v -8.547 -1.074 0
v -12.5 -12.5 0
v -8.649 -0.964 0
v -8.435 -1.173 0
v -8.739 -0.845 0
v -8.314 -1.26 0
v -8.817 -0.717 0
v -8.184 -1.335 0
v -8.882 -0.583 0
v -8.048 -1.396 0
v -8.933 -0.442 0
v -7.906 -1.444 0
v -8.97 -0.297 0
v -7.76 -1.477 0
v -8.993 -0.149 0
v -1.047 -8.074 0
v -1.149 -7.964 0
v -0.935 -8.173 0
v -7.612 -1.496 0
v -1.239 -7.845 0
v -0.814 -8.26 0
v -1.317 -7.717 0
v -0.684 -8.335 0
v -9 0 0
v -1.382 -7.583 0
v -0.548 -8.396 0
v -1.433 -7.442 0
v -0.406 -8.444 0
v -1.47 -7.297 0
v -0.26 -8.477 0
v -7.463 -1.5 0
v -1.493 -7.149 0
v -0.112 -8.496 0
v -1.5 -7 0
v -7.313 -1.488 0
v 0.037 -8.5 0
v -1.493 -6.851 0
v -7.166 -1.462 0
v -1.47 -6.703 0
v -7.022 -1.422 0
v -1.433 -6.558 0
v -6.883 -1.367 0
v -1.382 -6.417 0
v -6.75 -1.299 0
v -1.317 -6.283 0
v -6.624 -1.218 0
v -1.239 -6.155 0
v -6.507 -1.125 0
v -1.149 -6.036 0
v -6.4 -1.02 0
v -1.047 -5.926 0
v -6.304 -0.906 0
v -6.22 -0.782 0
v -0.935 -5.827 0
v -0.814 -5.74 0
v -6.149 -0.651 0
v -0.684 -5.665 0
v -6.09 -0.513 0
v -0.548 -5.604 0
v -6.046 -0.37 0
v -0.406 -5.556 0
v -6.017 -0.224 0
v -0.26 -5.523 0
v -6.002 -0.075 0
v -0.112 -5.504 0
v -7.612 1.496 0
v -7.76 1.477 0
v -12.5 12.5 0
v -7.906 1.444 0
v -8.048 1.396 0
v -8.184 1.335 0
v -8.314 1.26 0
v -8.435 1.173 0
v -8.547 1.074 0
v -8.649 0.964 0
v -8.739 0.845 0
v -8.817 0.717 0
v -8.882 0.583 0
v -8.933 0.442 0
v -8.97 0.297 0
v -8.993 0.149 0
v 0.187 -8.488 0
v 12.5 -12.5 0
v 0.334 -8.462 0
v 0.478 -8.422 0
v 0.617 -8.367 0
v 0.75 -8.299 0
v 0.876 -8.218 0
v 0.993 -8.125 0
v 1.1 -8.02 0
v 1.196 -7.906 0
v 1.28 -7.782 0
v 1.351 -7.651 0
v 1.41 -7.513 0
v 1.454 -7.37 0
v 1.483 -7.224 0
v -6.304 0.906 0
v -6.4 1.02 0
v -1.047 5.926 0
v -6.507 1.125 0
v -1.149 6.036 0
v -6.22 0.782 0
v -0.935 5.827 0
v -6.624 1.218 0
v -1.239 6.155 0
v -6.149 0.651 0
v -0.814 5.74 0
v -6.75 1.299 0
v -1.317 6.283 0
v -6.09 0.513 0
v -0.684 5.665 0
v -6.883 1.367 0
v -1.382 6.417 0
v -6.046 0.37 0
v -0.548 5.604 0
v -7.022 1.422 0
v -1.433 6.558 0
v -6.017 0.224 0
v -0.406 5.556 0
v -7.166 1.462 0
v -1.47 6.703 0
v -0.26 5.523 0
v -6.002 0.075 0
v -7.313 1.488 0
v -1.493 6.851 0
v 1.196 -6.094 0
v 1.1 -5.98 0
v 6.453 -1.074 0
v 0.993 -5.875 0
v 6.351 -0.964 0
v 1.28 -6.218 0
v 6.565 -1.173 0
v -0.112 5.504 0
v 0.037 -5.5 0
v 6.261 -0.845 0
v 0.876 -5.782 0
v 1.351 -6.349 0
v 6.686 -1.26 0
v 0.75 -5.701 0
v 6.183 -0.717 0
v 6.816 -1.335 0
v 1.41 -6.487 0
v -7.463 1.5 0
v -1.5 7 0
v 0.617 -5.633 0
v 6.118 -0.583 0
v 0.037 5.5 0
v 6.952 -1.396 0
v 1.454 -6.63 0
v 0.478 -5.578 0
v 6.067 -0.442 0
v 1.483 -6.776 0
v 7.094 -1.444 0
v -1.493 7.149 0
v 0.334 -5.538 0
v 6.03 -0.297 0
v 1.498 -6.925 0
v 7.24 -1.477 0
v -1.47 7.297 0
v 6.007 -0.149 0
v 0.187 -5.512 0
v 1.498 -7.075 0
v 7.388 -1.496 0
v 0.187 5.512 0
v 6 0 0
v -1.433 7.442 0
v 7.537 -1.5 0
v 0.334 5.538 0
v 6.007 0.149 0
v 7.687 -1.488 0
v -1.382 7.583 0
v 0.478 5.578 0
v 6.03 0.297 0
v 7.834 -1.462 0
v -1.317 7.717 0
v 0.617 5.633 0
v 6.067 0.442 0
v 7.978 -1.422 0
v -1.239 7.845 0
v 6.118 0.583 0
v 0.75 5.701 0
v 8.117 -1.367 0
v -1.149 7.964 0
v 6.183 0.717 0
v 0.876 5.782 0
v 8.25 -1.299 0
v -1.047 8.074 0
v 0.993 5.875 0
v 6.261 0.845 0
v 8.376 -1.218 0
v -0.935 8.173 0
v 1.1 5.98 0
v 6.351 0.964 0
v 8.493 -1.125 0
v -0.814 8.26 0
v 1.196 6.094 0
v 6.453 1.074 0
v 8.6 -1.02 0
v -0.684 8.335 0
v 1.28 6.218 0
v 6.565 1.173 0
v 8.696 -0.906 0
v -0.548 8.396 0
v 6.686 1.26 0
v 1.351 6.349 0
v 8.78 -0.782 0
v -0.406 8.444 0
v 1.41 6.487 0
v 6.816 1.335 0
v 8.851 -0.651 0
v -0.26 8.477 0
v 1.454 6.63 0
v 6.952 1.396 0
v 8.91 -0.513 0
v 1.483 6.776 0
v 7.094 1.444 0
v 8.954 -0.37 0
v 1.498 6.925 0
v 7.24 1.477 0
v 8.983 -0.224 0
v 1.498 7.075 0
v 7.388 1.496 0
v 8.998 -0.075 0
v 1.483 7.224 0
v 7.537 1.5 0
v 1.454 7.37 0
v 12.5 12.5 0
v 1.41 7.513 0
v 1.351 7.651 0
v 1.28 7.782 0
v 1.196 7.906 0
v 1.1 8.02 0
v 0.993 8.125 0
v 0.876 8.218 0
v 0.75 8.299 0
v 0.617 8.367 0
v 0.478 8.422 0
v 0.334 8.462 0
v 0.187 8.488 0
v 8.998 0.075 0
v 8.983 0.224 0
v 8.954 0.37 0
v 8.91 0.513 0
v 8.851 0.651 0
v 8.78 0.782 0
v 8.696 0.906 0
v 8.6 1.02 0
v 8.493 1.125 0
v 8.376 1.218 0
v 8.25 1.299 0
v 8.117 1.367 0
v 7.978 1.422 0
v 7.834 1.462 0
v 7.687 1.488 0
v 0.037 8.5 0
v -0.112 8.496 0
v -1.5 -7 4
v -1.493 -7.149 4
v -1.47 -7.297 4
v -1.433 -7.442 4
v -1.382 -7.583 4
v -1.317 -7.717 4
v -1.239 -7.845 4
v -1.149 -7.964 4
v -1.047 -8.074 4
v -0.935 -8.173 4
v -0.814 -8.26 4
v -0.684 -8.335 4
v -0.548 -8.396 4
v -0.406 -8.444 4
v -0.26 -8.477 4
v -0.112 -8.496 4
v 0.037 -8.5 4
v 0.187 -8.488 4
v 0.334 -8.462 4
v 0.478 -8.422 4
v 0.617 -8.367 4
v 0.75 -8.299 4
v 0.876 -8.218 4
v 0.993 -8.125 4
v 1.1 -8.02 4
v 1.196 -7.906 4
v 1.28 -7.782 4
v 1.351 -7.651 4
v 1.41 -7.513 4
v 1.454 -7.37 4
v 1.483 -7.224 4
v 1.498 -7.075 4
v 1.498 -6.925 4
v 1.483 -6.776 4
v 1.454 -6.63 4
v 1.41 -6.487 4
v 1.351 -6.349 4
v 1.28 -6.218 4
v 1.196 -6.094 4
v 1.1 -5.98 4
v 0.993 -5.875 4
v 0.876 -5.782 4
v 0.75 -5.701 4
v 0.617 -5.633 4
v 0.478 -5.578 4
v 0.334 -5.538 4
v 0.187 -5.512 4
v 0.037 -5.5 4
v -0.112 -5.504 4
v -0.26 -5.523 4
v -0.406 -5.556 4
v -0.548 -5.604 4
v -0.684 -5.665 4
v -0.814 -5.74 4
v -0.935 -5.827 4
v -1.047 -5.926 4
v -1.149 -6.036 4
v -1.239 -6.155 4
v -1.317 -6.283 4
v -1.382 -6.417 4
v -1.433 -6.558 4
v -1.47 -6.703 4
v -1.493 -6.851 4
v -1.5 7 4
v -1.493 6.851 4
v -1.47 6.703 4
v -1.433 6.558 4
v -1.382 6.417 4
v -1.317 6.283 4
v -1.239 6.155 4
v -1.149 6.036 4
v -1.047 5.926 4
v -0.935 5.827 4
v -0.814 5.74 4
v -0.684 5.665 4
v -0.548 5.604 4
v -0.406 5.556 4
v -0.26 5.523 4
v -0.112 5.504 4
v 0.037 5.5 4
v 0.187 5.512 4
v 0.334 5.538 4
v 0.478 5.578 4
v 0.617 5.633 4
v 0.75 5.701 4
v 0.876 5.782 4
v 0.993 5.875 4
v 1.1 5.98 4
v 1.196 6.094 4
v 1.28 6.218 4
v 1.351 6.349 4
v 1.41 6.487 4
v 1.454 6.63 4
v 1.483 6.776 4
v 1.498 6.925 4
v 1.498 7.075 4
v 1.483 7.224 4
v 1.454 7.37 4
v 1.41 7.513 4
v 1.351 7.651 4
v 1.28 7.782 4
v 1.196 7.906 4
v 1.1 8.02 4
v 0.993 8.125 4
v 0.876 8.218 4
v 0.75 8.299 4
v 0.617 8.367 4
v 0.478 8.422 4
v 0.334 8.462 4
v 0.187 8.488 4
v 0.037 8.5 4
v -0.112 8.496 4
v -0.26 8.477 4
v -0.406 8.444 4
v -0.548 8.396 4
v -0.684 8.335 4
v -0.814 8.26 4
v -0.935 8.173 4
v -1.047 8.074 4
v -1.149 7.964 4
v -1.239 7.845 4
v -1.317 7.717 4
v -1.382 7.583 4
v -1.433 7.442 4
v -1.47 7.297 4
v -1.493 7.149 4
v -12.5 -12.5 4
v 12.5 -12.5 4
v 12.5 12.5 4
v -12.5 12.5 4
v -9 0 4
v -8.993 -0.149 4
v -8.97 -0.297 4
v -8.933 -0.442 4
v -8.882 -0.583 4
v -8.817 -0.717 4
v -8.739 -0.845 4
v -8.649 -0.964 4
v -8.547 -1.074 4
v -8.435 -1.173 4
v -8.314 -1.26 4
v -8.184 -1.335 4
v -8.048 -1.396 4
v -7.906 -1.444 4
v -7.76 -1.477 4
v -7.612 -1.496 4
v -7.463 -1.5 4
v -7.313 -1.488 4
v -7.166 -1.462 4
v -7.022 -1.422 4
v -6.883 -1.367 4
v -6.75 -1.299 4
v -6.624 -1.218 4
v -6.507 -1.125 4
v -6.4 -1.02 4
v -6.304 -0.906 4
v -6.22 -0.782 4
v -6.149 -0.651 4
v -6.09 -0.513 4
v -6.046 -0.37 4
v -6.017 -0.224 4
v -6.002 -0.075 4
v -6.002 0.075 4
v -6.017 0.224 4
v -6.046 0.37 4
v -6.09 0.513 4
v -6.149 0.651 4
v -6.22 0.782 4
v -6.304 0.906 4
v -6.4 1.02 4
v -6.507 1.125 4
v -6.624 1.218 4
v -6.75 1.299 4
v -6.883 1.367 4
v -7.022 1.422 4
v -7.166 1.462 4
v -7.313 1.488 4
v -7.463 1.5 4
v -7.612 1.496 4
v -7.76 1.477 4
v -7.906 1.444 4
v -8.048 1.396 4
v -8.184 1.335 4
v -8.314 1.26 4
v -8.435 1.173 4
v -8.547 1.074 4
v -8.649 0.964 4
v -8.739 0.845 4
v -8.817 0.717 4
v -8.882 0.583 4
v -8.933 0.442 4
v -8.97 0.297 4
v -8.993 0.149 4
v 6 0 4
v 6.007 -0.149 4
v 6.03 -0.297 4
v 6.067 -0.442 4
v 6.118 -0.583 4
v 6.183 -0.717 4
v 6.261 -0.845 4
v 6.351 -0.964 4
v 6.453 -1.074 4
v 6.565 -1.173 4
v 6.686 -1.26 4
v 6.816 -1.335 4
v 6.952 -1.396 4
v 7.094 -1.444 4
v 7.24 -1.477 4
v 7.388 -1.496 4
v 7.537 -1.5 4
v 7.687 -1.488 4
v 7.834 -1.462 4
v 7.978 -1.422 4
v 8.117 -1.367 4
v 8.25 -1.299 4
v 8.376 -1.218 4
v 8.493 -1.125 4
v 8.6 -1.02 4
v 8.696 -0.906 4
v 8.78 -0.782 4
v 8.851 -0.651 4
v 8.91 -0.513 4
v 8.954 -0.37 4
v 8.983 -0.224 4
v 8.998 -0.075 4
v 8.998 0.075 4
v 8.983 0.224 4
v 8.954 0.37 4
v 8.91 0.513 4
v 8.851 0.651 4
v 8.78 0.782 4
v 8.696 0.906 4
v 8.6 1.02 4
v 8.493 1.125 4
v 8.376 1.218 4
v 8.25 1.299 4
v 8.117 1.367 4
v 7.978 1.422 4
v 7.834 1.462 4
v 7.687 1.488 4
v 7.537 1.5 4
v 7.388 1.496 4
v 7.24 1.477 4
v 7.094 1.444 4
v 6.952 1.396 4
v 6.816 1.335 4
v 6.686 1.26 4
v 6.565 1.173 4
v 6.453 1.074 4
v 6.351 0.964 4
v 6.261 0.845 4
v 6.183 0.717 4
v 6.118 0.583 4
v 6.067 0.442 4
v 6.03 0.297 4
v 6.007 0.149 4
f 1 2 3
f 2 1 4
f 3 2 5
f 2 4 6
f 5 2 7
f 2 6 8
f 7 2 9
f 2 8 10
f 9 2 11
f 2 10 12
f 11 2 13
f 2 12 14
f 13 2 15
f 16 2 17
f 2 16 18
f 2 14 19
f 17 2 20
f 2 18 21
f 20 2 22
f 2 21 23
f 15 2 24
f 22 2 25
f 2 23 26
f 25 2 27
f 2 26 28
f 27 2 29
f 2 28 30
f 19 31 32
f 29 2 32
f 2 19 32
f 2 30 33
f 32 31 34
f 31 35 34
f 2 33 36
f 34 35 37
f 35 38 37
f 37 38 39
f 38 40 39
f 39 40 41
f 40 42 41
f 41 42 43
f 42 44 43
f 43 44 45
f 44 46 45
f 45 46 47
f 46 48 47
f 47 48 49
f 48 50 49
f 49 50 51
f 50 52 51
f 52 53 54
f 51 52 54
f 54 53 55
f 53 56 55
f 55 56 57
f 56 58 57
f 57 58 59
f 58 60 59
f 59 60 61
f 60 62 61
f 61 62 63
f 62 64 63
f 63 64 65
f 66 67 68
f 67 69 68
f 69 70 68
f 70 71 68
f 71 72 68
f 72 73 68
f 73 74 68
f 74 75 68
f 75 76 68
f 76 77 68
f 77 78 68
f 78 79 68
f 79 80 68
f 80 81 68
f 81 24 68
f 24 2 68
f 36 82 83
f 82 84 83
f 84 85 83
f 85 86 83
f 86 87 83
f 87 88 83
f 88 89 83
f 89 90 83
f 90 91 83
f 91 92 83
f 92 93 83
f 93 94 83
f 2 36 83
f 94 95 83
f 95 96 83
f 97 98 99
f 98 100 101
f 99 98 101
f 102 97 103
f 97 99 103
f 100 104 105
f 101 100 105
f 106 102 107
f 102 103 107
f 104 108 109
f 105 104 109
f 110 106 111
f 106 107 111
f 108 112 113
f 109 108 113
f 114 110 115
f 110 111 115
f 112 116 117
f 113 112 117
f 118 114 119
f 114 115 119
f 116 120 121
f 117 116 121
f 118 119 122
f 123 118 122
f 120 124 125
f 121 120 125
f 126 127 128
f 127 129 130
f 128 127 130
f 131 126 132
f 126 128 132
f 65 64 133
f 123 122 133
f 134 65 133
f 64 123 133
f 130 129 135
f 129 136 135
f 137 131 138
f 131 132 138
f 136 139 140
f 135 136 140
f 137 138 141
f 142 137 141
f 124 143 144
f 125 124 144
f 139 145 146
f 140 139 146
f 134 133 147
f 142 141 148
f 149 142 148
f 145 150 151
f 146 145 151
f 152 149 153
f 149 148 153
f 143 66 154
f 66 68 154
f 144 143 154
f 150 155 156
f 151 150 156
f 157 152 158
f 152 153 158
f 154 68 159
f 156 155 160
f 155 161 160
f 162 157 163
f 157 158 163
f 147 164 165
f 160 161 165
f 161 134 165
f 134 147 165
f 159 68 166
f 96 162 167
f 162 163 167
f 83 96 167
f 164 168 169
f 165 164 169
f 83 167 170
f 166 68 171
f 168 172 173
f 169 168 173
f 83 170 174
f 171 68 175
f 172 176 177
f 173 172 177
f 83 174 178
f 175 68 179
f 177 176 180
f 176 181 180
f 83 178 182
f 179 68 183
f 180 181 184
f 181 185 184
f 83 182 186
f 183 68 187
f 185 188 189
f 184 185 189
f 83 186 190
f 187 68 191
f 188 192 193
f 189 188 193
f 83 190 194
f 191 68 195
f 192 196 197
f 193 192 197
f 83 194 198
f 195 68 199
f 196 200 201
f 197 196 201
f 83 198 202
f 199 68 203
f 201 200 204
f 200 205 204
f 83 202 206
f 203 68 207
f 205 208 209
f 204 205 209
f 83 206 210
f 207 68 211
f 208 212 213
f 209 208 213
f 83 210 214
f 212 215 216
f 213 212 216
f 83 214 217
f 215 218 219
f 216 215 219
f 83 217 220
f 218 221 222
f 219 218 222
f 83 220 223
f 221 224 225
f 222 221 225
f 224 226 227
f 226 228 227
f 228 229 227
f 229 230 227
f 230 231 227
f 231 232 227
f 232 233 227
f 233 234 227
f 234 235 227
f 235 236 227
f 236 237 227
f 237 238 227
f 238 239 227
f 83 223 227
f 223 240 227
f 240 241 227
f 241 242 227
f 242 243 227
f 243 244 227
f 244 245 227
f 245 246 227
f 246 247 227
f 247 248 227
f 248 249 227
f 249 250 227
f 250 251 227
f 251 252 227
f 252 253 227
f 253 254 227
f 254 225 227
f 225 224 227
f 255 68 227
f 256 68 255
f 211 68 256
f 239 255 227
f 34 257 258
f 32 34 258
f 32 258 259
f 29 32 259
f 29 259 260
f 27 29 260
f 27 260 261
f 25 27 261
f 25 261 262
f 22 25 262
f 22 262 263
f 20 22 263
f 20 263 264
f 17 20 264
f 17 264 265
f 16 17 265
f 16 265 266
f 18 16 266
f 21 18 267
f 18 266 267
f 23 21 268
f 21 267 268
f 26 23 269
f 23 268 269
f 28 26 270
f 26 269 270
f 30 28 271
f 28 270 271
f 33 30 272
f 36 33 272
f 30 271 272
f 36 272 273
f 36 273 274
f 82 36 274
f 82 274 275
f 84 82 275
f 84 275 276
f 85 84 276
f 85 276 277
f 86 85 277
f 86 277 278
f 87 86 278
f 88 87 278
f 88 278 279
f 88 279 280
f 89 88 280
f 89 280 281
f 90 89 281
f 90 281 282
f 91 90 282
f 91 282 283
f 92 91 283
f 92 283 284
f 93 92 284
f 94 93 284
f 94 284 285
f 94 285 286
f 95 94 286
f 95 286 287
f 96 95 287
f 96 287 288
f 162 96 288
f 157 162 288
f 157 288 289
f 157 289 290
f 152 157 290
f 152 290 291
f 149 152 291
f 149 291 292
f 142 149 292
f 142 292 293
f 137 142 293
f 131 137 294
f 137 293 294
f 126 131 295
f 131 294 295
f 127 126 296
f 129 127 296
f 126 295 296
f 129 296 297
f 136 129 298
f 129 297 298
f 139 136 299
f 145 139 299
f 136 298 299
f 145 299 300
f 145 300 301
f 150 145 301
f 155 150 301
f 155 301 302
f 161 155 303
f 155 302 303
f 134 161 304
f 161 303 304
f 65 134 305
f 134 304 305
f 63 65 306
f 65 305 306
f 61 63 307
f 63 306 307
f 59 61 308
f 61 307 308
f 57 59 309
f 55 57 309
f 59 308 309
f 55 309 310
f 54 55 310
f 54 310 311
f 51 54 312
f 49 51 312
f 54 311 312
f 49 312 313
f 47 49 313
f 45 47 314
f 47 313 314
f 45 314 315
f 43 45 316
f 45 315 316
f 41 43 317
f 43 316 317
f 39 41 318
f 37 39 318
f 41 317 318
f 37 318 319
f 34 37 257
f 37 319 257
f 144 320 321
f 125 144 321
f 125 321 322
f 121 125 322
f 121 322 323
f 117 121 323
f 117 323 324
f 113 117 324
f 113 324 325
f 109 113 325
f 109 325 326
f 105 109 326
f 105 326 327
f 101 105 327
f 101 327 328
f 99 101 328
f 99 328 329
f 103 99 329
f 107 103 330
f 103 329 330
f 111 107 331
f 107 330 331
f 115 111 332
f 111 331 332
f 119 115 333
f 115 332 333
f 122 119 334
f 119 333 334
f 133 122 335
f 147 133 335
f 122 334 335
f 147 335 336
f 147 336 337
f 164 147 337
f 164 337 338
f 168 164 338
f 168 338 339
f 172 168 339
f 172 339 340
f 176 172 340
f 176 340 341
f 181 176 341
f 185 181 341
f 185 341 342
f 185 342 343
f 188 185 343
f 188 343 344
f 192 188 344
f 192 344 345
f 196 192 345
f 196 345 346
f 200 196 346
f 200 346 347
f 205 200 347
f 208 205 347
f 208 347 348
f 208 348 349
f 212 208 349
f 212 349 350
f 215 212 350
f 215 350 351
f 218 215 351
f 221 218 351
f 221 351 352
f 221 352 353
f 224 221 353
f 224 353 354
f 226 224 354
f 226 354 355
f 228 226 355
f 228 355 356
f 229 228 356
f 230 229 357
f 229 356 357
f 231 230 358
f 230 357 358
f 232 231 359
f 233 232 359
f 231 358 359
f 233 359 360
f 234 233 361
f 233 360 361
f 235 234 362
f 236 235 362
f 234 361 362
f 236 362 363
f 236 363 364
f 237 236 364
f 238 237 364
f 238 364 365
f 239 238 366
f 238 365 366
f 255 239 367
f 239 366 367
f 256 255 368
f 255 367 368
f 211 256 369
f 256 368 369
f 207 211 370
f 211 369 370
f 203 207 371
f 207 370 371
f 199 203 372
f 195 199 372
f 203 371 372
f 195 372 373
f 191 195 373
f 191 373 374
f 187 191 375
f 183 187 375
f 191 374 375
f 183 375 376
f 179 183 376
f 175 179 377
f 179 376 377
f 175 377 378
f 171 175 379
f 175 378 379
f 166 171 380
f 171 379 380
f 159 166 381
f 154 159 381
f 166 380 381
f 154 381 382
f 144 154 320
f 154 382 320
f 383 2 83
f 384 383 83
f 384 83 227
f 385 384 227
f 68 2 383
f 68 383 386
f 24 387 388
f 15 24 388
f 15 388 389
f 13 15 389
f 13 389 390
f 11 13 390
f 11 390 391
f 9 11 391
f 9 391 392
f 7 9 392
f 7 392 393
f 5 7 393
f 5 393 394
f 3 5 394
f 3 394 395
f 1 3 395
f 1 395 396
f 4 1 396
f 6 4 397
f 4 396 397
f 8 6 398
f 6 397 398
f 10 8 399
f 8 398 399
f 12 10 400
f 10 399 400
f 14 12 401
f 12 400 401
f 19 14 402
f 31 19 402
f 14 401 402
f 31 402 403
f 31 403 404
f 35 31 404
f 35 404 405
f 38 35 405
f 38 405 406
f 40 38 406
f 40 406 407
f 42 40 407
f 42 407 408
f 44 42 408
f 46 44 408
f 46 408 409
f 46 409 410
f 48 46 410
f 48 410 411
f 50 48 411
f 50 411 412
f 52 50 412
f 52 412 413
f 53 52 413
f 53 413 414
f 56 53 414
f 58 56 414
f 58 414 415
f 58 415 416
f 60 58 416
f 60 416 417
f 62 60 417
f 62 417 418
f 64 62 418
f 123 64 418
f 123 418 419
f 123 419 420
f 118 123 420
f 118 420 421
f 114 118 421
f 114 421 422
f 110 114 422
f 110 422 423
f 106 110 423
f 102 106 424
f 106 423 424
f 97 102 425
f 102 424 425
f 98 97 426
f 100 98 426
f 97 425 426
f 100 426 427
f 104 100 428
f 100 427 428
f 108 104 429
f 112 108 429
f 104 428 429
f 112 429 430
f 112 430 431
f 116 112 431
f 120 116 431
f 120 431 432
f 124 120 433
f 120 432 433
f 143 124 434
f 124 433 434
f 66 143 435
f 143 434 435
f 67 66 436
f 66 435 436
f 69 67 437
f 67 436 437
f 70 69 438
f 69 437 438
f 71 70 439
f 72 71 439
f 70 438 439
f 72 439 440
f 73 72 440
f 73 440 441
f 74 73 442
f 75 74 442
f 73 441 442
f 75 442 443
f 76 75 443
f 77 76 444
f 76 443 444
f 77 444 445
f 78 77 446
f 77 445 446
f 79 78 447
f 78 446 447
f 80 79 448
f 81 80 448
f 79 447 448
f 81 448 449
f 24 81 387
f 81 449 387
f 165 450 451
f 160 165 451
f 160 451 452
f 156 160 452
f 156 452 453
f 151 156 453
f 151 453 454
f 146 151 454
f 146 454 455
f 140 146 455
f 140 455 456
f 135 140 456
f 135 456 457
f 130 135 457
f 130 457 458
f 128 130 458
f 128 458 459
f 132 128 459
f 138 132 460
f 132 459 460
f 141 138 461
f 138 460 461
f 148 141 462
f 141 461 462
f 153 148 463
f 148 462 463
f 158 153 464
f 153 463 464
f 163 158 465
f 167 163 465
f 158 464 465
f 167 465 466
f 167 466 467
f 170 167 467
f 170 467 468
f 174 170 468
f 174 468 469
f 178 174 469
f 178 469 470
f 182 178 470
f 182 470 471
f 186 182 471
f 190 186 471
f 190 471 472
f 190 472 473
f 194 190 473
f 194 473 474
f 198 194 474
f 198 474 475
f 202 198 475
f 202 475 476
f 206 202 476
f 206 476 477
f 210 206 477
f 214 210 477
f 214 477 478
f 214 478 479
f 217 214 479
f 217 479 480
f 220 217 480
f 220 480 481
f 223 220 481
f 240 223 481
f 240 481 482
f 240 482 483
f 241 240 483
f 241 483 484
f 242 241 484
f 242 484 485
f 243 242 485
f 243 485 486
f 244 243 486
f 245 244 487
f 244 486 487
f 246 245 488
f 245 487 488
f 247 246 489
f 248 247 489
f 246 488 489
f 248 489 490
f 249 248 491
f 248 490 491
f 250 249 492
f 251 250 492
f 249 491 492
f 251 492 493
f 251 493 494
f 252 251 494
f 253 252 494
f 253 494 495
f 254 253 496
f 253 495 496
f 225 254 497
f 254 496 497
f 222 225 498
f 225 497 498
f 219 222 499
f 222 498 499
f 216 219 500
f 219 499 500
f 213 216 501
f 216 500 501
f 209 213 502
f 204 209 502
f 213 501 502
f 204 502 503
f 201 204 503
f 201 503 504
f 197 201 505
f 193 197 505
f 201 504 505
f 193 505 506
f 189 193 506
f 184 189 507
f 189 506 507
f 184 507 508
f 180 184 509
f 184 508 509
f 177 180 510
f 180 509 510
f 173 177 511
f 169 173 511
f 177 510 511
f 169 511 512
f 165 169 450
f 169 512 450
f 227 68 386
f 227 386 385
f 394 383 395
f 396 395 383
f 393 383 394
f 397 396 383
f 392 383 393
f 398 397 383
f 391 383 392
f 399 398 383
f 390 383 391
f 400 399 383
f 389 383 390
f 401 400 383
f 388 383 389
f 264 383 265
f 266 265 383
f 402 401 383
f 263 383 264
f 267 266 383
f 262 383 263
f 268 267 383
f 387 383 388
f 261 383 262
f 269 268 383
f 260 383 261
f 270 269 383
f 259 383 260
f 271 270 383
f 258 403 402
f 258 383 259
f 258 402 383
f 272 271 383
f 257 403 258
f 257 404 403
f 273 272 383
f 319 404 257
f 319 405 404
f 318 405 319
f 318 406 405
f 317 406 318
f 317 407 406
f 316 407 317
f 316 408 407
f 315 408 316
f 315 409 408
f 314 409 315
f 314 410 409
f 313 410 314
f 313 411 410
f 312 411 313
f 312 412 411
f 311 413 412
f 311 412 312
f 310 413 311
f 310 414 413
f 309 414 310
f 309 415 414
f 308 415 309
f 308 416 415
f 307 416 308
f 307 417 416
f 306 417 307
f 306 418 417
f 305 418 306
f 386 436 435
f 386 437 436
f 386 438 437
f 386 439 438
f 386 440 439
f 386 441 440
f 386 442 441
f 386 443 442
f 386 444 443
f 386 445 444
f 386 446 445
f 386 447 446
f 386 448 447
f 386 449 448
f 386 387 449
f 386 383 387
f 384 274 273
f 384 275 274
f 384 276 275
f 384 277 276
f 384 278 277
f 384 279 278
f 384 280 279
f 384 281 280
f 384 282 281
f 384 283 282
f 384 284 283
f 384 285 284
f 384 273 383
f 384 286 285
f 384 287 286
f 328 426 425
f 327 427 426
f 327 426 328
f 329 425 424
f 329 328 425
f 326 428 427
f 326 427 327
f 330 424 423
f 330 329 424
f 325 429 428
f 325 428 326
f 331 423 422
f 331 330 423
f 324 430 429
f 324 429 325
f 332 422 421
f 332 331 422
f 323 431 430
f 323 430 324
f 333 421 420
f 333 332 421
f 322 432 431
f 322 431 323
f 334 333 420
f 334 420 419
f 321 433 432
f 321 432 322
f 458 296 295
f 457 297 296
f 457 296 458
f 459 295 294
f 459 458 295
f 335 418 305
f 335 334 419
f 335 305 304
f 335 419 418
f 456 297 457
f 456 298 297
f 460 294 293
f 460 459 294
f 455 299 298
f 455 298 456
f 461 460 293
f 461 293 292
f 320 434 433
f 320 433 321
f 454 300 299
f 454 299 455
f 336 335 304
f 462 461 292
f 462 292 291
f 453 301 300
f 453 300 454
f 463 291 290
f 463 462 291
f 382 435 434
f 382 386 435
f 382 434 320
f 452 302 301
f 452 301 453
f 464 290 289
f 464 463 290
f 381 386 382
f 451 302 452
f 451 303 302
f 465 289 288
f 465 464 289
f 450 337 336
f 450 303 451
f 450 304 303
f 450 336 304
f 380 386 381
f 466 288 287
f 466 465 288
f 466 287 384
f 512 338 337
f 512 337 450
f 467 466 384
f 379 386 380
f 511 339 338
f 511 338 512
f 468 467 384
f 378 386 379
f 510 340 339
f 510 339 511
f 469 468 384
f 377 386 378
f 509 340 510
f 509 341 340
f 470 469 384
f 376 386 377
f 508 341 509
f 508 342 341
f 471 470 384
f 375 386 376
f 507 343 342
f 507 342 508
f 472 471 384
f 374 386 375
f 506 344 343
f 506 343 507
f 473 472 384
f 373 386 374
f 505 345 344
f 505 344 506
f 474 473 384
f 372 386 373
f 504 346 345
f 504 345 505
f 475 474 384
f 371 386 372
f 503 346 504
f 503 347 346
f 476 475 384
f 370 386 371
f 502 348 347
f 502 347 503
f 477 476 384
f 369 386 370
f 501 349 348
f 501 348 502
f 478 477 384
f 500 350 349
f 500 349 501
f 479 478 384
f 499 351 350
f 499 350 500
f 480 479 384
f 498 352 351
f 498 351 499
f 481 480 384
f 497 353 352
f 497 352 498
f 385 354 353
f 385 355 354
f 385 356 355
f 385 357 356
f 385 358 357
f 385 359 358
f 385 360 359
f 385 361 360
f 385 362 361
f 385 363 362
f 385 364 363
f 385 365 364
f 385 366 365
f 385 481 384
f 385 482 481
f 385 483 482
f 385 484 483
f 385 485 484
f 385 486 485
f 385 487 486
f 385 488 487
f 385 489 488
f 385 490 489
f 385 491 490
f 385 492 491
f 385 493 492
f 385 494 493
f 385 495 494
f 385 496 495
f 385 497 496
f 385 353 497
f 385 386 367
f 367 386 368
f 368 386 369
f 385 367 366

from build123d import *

# Parameters (mm, degrees)
F0_W     = 25
F0_H     = 25
F1_DEPTH = 4
F2_D     = 3


# Not quite as in the source:
# - a feature names something its author has since deleted; it is built from what else it names


with BuildPart() as f1:
    # F0 (on Top) → F1 (new body)
    with BuildSketch(Plane.XY):
        Rectangle(F0_W, F0_H)
    extrude(amount=F1_DEPTH)

    # F2 (through all)
    with Locations(Plane(origin=(0, 0, 0), x_dir=(1, 0, 0), z_dir=(0, 0, -1))):
        with Locations((-7.5, 0), (7.5, 0), (0, -7), (0, 7)):
            Hole(F2_D / 2)


solid = f1.part
